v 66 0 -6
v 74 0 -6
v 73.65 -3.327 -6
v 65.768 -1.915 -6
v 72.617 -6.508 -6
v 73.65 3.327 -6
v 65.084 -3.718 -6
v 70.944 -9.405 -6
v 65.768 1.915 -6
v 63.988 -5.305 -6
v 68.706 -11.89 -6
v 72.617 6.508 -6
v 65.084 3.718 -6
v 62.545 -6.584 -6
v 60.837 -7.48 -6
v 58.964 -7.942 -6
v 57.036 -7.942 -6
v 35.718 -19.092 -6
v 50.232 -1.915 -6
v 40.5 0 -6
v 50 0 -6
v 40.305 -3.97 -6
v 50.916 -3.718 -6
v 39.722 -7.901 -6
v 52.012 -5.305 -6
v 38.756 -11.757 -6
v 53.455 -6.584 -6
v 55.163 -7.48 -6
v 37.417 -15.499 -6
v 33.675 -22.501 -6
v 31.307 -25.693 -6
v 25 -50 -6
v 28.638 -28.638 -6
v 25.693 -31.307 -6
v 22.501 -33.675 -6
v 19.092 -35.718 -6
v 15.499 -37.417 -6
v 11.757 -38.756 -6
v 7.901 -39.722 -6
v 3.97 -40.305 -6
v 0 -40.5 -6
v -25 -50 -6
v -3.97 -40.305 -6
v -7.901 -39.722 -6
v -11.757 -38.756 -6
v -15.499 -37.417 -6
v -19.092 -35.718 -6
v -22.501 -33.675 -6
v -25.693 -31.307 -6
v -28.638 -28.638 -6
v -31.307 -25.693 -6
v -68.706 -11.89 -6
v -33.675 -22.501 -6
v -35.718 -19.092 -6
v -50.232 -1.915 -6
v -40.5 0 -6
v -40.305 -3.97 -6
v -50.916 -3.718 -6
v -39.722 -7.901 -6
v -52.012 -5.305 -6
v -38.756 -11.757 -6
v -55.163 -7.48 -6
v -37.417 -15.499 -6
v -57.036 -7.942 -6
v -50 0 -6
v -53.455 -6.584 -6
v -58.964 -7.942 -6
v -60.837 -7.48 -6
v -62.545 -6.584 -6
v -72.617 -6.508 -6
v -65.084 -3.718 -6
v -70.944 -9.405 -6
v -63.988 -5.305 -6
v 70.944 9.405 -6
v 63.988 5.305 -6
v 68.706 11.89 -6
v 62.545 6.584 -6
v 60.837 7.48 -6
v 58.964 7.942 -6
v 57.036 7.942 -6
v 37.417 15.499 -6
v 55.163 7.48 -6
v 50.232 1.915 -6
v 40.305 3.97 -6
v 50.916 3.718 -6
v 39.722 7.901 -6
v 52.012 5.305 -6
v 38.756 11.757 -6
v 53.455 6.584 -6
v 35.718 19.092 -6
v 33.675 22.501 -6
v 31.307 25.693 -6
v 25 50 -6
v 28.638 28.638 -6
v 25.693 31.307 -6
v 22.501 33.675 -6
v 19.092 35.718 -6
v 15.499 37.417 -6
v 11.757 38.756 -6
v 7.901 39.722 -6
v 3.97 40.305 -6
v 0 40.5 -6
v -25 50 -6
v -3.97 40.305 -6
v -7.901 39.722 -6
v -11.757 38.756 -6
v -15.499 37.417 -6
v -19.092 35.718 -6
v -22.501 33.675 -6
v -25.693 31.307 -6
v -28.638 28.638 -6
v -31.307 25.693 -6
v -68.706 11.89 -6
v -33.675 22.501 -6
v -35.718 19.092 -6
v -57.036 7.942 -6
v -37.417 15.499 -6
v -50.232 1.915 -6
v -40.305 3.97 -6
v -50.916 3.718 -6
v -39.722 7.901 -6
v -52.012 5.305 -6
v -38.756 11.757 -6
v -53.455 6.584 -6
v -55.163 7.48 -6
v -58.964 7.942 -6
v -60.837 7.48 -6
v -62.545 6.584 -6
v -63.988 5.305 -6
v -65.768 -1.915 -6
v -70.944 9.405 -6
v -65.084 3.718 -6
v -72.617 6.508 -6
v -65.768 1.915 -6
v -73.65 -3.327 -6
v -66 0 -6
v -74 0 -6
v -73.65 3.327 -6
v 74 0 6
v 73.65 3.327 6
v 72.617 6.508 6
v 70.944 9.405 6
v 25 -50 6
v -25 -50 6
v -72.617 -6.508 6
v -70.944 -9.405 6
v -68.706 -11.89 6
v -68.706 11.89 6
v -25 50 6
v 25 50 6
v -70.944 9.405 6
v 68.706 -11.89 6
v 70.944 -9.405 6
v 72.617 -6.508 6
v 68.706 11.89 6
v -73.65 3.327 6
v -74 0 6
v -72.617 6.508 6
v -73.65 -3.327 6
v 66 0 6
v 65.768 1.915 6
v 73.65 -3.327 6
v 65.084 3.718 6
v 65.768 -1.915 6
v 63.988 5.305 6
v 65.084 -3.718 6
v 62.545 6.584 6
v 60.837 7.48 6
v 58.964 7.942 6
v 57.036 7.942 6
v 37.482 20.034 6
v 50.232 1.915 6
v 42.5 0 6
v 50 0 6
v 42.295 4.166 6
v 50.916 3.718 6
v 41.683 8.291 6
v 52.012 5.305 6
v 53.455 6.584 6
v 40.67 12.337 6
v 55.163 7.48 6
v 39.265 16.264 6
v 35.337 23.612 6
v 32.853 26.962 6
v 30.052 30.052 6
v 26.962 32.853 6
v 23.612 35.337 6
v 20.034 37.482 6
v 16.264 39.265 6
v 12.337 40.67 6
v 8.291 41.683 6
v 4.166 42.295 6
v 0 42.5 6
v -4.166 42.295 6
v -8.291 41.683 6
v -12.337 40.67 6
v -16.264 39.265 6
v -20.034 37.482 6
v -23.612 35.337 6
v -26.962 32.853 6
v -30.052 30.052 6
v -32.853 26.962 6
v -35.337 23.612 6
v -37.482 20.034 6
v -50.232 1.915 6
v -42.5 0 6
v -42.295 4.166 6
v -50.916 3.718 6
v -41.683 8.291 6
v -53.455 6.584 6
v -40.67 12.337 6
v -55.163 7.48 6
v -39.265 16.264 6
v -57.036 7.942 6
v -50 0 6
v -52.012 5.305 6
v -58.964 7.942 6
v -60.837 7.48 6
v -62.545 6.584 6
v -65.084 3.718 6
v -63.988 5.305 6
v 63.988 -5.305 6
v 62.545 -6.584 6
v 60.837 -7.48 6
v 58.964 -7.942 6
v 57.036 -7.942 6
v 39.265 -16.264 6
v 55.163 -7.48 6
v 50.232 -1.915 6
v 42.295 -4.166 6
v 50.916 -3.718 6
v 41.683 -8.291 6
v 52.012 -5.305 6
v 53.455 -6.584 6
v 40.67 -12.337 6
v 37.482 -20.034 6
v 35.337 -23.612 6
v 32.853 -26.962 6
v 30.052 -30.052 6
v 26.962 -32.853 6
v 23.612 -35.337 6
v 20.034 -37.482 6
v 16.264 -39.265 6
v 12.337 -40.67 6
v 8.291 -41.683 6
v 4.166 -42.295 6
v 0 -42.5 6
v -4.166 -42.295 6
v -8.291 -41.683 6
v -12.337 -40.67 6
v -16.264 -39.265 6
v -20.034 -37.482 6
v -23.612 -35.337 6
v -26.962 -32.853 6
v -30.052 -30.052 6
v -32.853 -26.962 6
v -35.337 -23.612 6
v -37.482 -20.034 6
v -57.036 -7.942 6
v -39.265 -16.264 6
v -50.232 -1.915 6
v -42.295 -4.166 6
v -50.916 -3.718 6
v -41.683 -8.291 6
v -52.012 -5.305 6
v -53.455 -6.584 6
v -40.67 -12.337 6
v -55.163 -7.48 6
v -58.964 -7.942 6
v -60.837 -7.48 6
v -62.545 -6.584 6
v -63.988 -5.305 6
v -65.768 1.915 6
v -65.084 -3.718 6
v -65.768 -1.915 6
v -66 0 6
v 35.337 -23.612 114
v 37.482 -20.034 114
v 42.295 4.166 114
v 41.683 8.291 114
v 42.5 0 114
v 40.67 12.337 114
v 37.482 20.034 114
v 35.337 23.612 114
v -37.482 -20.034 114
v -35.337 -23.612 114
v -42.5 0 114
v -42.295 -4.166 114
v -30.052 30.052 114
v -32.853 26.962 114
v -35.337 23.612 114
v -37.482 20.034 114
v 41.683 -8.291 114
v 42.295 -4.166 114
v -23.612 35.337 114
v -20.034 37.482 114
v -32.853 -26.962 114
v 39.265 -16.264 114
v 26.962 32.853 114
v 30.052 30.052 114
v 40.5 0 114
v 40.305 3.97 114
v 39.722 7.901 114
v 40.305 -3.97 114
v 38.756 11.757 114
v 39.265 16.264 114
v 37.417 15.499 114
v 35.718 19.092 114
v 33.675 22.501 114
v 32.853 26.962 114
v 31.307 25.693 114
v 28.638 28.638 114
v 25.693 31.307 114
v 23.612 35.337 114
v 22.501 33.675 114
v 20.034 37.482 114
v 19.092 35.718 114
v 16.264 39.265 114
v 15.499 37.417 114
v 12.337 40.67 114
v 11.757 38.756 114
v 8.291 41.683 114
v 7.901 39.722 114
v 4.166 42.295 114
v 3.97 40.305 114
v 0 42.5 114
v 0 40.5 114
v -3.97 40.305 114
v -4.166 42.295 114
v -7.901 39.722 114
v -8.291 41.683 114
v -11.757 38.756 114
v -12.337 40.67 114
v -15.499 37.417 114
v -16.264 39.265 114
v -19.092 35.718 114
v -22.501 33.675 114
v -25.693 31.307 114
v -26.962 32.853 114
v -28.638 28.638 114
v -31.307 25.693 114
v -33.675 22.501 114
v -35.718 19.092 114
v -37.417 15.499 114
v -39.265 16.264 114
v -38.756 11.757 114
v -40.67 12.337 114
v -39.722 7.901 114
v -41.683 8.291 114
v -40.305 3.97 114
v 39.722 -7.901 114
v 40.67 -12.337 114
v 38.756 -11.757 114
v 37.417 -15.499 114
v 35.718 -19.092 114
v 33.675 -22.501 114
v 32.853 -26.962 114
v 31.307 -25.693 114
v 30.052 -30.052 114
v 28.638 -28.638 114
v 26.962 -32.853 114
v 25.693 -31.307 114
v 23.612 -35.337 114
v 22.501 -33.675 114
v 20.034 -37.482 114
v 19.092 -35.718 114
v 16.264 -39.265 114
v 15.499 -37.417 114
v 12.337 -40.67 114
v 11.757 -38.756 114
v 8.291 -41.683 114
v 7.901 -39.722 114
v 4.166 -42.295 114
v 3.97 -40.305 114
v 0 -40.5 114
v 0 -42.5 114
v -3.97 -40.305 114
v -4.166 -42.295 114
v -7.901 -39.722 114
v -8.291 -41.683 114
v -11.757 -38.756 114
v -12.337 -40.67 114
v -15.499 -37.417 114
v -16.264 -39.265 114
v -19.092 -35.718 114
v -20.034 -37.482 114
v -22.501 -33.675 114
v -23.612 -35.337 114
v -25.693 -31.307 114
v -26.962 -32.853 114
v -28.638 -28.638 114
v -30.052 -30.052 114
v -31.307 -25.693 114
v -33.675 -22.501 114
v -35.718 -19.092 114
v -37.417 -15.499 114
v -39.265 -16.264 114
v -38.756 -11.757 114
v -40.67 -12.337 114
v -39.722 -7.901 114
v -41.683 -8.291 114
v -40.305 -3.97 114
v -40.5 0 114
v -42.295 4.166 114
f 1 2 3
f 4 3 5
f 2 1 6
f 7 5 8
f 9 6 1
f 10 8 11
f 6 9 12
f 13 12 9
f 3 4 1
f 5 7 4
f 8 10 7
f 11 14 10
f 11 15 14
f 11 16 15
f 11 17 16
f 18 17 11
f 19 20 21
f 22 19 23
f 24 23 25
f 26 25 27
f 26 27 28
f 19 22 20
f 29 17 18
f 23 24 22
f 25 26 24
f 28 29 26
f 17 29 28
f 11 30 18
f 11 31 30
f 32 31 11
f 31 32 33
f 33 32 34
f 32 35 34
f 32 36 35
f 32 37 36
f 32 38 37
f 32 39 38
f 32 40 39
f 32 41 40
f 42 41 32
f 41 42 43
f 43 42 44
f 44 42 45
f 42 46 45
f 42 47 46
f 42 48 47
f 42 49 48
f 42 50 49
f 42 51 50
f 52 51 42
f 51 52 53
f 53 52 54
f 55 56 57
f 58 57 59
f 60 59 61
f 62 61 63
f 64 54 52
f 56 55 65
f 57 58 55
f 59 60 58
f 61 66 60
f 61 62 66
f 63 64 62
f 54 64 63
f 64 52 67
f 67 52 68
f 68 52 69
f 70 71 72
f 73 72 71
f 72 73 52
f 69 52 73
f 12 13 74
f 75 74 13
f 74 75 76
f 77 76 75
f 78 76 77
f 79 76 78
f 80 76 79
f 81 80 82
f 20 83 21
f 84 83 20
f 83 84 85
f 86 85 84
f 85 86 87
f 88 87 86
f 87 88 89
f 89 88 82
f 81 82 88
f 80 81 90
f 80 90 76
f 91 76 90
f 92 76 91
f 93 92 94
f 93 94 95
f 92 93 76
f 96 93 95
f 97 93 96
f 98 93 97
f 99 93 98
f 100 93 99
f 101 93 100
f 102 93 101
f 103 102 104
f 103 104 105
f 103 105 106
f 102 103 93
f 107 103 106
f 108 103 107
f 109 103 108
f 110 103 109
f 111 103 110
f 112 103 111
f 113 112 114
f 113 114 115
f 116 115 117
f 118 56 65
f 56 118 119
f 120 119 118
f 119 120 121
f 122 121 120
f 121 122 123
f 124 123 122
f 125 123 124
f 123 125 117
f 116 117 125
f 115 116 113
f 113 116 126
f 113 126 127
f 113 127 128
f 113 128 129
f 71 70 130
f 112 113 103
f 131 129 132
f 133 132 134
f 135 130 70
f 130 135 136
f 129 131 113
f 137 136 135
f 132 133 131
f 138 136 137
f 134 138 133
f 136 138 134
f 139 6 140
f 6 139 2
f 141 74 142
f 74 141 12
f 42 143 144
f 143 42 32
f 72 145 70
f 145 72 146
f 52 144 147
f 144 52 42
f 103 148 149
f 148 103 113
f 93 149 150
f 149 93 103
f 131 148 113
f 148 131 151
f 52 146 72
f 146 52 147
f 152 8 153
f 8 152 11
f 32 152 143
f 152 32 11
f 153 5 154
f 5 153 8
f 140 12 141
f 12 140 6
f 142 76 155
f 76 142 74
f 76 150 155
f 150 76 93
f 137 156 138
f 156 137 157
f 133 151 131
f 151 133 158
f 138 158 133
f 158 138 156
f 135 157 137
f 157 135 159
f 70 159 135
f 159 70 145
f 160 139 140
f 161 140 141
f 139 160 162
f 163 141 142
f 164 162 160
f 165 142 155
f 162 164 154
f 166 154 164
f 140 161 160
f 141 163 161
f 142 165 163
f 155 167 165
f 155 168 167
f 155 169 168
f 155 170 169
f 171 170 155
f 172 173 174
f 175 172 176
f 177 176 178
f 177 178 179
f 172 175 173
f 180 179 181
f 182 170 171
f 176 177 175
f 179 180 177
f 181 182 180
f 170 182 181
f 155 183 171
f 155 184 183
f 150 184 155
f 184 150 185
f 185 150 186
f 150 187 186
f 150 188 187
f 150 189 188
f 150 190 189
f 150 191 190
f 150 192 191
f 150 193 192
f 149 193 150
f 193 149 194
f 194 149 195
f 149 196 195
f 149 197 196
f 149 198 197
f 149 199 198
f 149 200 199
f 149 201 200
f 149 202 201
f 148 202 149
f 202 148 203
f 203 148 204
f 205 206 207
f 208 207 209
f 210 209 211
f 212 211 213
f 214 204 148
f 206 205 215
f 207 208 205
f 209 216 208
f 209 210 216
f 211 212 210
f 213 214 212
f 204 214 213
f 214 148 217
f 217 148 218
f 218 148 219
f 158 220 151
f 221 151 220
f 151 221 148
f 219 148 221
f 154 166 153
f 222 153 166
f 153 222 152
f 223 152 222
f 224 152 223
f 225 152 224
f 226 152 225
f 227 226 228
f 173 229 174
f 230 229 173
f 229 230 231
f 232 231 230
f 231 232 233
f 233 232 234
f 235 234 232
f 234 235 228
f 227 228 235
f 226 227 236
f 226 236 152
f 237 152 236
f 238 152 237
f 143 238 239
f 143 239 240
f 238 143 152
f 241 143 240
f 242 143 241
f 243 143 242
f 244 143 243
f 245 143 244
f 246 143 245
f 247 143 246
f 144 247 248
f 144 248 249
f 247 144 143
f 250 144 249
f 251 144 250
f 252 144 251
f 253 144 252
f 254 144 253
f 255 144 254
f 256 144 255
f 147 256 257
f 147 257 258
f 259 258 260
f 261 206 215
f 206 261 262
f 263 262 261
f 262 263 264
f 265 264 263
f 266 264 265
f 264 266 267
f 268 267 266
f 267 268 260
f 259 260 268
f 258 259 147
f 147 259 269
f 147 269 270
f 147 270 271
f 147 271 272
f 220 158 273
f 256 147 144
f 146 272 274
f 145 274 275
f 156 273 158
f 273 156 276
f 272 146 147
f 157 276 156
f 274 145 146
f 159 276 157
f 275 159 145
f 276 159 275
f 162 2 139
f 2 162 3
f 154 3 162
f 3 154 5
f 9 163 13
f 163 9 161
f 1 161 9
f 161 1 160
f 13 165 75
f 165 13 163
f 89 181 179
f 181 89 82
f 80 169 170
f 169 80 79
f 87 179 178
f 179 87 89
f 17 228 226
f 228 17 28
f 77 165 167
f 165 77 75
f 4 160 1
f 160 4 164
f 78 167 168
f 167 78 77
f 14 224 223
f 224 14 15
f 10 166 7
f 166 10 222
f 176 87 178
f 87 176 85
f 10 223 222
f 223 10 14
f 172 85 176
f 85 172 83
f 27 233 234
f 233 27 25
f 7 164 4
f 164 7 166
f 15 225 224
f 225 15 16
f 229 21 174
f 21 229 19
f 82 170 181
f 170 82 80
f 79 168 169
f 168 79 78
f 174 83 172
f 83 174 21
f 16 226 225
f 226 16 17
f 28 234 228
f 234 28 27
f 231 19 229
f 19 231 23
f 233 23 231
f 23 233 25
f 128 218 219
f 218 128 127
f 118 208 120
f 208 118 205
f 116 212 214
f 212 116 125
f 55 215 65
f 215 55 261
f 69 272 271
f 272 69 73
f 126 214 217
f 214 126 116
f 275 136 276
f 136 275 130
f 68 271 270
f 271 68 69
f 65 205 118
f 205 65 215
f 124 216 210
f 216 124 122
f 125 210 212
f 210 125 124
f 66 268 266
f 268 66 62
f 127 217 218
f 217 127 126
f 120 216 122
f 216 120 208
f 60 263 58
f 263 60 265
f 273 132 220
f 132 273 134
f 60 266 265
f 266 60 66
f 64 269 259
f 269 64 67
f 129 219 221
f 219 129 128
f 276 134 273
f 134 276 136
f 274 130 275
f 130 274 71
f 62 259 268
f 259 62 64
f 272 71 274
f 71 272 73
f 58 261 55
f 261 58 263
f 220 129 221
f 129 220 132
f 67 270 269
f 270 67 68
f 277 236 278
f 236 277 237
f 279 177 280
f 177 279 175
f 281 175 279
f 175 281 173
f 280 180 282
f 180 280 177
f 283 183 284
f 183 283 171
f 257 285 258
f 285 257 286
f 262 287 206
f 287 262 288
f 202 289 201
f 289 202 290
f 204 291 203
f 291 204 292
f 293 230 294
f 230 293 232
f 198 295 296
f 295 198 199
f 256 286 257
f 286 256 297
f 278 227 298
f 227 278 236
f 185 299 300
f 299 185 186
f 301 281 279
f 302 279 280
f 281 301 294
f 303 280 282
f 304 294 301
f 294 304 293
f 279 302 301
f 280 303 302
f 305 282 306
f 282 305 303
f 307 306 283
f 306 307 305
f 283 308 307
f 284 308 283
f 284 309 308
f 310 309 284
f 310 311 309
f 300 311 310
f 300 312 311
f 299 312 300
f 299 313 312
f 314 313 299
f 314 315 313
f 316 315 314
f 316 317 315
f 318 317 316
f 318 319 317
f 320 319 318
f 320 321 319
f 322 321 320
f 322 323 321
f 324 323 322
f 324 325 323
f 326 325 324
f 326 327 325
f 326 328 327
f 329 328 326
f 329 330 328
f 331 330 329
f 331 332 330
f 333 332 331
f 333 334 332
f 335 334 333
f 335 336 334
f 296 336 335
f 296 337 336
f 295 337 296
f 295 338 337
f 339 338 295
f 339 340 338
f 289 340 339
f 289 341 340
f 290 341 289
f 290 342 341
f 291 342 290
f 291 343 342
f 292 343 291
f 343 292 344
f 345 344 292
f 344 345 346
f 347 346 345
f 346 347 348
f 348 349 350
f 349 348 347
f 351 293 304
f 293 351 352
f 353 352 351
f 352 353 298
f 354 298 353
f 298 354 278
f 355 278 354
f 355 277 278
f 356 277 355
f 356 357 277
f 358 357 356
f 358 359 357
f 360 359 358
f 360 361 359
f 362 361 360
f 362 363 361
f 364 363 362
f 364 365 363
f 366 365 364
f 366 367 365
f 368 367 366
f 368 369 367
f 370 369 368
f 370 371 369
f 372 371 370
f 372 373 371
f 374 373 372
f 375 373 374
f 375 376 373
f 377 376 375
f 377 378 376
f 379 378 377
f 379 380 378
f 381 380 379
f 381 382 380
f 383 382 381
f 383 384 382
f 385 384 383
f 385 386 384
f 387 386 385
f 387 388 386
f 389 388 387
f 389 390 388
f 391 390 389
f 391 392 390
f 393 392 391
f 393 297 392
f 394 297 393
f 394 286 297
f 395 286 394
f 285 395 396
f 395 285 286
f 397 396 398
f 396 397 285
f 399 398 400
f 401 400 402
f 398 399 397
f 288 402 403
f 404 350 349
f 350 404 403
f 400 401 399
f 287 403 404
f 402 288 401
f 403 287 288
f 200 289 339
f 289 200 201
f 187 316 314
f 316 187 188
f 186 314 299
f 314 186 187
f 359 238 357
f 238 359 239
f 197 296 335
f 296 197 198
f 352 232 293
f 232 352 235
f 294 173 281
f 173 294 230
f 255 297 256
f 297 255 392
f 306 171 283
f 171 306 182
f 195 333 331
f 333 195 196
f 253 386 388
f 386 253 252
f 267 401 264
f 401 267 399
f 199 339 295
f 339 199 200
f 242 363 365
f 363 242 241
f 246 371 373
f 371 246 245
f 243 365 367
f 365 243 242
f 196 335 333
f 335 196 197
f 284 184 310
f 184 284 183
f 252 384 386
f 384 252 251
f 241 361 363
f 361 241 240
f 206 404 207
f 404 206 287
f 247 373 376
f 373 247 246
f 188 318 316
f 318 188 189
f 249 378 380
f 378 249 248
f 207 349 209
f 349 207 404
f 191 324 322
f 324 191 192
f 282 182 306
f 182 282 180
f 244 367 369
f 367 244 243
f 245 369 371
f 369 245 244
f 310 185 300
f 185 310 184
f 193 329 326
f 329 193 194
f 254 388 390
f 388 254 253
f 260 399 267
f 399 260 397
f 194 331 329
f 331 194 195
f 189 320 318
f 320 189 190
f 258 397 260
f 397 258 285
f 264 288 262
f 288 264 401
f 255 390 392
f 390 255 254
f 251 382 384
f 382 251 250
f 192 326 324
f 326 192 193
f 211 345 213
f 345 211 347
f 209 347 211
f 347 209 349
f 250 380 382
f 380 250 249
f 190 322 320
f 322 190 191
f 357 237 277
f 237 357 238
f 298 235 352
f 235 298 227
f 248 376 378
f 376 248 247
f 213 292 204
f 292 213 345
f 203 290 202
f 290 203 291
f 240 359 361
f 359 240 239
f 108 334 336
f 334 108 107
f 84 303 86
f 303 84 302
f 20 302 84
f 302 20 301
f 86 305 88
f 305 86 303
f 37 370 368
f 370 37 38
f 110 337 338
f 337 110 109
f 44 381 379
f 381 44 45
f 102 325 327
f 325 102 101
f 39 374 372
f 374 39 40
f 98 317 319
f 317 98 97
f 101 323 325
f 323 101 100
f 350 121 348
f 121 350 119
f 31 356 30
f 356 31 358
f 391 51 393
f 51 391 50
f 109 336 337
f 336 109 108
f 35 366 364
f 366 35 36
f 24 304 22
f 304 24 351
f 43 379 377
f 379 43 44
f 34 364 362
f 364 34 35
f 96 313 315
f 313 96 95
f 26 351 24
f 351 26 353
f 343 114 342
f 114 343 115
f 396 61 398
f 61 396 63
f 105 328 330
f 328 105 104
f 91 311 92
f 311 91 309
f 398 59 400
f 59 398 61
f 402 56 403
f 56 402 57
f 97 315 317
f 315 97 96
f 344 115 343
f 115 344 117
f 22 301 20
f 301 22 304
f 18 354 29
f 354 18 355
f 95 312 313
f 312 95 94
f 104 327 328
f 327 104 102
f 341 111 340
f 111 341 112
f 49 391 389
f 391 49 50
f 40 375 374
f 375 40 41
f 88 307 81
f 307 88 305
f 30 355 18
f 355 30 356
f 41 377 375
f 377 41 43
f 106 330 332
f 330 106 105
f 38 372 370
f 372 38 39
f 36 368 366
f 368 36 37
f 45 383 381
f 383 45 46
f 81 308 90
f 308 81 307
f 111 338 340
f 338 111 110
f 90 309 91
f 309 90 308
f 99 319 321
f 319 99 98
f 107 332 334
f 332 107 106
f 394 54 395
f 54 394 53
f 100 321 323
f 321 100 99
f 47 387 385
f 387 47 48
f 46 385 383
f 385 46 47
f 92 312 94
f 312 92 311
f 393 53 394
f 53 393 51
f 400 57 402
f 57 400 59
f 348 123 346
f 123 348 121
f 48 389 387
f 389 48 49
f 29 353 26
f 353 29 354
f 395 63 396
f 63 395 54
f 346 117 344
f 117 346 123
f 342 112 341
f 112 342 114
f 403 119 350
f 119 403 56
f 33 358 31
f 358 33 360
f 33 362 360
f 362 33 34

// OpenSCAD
use <MCAD/polyholes.scad>

mount_thickness = 12;
mount_hole_d = 16;
mount_tab_d = 16;
mount_plate_width = 50;
mount_plate_depth = 100;

intake_mount_d = 85;
intake_top_d = 85;
intake_height = 120;
intake_wall_thickness = 2;

difference()
{
    union()
    {
        difference()
        {
            hull()
            {
                cube(size=[mount_plate_width,mount_plate_depth,mount_thickness], center = true);
                translate([mount_plate_width + mount_tab_d/2,0,0])
                    cylinder(h=mount_thickness, r=mount_tab_d, center = true);
                translate([-(mount_plate_width + mount_tab_d/2),0,0])
                    cylinder(h=mount_thickness, r=mount_tab_d, center = true);
            }
            translate([mount_plate_width + mount_tab_d/2,0,0])
                cylinder(h=mount_thickness+1, r=mount_hole_d/2 , center = true);
            translate([-(mount_plate_width + mount_tab_d/2),0,0])
                cylinder(h=mount_thickness+1, r=mount_hole_d/2 , center = true);
        }
        translate([0,0,(intake_height/2)-mount_thickness/2]) cylinder(h=intake_height, r1=intake_mount_d/2, r2=intake_top_d/2, center = true, $fn=64);
    }
    translate([0,0,(intake_height/2)-mount_thickness/2])
        cylinder(h=intake_height+intake_wall_thickness, r1=intake_mount_d/2 - intake_wall_thickness, r2=intake_top_d/2 - intake_wall_thickness, center = true, $fn = 64);
}
